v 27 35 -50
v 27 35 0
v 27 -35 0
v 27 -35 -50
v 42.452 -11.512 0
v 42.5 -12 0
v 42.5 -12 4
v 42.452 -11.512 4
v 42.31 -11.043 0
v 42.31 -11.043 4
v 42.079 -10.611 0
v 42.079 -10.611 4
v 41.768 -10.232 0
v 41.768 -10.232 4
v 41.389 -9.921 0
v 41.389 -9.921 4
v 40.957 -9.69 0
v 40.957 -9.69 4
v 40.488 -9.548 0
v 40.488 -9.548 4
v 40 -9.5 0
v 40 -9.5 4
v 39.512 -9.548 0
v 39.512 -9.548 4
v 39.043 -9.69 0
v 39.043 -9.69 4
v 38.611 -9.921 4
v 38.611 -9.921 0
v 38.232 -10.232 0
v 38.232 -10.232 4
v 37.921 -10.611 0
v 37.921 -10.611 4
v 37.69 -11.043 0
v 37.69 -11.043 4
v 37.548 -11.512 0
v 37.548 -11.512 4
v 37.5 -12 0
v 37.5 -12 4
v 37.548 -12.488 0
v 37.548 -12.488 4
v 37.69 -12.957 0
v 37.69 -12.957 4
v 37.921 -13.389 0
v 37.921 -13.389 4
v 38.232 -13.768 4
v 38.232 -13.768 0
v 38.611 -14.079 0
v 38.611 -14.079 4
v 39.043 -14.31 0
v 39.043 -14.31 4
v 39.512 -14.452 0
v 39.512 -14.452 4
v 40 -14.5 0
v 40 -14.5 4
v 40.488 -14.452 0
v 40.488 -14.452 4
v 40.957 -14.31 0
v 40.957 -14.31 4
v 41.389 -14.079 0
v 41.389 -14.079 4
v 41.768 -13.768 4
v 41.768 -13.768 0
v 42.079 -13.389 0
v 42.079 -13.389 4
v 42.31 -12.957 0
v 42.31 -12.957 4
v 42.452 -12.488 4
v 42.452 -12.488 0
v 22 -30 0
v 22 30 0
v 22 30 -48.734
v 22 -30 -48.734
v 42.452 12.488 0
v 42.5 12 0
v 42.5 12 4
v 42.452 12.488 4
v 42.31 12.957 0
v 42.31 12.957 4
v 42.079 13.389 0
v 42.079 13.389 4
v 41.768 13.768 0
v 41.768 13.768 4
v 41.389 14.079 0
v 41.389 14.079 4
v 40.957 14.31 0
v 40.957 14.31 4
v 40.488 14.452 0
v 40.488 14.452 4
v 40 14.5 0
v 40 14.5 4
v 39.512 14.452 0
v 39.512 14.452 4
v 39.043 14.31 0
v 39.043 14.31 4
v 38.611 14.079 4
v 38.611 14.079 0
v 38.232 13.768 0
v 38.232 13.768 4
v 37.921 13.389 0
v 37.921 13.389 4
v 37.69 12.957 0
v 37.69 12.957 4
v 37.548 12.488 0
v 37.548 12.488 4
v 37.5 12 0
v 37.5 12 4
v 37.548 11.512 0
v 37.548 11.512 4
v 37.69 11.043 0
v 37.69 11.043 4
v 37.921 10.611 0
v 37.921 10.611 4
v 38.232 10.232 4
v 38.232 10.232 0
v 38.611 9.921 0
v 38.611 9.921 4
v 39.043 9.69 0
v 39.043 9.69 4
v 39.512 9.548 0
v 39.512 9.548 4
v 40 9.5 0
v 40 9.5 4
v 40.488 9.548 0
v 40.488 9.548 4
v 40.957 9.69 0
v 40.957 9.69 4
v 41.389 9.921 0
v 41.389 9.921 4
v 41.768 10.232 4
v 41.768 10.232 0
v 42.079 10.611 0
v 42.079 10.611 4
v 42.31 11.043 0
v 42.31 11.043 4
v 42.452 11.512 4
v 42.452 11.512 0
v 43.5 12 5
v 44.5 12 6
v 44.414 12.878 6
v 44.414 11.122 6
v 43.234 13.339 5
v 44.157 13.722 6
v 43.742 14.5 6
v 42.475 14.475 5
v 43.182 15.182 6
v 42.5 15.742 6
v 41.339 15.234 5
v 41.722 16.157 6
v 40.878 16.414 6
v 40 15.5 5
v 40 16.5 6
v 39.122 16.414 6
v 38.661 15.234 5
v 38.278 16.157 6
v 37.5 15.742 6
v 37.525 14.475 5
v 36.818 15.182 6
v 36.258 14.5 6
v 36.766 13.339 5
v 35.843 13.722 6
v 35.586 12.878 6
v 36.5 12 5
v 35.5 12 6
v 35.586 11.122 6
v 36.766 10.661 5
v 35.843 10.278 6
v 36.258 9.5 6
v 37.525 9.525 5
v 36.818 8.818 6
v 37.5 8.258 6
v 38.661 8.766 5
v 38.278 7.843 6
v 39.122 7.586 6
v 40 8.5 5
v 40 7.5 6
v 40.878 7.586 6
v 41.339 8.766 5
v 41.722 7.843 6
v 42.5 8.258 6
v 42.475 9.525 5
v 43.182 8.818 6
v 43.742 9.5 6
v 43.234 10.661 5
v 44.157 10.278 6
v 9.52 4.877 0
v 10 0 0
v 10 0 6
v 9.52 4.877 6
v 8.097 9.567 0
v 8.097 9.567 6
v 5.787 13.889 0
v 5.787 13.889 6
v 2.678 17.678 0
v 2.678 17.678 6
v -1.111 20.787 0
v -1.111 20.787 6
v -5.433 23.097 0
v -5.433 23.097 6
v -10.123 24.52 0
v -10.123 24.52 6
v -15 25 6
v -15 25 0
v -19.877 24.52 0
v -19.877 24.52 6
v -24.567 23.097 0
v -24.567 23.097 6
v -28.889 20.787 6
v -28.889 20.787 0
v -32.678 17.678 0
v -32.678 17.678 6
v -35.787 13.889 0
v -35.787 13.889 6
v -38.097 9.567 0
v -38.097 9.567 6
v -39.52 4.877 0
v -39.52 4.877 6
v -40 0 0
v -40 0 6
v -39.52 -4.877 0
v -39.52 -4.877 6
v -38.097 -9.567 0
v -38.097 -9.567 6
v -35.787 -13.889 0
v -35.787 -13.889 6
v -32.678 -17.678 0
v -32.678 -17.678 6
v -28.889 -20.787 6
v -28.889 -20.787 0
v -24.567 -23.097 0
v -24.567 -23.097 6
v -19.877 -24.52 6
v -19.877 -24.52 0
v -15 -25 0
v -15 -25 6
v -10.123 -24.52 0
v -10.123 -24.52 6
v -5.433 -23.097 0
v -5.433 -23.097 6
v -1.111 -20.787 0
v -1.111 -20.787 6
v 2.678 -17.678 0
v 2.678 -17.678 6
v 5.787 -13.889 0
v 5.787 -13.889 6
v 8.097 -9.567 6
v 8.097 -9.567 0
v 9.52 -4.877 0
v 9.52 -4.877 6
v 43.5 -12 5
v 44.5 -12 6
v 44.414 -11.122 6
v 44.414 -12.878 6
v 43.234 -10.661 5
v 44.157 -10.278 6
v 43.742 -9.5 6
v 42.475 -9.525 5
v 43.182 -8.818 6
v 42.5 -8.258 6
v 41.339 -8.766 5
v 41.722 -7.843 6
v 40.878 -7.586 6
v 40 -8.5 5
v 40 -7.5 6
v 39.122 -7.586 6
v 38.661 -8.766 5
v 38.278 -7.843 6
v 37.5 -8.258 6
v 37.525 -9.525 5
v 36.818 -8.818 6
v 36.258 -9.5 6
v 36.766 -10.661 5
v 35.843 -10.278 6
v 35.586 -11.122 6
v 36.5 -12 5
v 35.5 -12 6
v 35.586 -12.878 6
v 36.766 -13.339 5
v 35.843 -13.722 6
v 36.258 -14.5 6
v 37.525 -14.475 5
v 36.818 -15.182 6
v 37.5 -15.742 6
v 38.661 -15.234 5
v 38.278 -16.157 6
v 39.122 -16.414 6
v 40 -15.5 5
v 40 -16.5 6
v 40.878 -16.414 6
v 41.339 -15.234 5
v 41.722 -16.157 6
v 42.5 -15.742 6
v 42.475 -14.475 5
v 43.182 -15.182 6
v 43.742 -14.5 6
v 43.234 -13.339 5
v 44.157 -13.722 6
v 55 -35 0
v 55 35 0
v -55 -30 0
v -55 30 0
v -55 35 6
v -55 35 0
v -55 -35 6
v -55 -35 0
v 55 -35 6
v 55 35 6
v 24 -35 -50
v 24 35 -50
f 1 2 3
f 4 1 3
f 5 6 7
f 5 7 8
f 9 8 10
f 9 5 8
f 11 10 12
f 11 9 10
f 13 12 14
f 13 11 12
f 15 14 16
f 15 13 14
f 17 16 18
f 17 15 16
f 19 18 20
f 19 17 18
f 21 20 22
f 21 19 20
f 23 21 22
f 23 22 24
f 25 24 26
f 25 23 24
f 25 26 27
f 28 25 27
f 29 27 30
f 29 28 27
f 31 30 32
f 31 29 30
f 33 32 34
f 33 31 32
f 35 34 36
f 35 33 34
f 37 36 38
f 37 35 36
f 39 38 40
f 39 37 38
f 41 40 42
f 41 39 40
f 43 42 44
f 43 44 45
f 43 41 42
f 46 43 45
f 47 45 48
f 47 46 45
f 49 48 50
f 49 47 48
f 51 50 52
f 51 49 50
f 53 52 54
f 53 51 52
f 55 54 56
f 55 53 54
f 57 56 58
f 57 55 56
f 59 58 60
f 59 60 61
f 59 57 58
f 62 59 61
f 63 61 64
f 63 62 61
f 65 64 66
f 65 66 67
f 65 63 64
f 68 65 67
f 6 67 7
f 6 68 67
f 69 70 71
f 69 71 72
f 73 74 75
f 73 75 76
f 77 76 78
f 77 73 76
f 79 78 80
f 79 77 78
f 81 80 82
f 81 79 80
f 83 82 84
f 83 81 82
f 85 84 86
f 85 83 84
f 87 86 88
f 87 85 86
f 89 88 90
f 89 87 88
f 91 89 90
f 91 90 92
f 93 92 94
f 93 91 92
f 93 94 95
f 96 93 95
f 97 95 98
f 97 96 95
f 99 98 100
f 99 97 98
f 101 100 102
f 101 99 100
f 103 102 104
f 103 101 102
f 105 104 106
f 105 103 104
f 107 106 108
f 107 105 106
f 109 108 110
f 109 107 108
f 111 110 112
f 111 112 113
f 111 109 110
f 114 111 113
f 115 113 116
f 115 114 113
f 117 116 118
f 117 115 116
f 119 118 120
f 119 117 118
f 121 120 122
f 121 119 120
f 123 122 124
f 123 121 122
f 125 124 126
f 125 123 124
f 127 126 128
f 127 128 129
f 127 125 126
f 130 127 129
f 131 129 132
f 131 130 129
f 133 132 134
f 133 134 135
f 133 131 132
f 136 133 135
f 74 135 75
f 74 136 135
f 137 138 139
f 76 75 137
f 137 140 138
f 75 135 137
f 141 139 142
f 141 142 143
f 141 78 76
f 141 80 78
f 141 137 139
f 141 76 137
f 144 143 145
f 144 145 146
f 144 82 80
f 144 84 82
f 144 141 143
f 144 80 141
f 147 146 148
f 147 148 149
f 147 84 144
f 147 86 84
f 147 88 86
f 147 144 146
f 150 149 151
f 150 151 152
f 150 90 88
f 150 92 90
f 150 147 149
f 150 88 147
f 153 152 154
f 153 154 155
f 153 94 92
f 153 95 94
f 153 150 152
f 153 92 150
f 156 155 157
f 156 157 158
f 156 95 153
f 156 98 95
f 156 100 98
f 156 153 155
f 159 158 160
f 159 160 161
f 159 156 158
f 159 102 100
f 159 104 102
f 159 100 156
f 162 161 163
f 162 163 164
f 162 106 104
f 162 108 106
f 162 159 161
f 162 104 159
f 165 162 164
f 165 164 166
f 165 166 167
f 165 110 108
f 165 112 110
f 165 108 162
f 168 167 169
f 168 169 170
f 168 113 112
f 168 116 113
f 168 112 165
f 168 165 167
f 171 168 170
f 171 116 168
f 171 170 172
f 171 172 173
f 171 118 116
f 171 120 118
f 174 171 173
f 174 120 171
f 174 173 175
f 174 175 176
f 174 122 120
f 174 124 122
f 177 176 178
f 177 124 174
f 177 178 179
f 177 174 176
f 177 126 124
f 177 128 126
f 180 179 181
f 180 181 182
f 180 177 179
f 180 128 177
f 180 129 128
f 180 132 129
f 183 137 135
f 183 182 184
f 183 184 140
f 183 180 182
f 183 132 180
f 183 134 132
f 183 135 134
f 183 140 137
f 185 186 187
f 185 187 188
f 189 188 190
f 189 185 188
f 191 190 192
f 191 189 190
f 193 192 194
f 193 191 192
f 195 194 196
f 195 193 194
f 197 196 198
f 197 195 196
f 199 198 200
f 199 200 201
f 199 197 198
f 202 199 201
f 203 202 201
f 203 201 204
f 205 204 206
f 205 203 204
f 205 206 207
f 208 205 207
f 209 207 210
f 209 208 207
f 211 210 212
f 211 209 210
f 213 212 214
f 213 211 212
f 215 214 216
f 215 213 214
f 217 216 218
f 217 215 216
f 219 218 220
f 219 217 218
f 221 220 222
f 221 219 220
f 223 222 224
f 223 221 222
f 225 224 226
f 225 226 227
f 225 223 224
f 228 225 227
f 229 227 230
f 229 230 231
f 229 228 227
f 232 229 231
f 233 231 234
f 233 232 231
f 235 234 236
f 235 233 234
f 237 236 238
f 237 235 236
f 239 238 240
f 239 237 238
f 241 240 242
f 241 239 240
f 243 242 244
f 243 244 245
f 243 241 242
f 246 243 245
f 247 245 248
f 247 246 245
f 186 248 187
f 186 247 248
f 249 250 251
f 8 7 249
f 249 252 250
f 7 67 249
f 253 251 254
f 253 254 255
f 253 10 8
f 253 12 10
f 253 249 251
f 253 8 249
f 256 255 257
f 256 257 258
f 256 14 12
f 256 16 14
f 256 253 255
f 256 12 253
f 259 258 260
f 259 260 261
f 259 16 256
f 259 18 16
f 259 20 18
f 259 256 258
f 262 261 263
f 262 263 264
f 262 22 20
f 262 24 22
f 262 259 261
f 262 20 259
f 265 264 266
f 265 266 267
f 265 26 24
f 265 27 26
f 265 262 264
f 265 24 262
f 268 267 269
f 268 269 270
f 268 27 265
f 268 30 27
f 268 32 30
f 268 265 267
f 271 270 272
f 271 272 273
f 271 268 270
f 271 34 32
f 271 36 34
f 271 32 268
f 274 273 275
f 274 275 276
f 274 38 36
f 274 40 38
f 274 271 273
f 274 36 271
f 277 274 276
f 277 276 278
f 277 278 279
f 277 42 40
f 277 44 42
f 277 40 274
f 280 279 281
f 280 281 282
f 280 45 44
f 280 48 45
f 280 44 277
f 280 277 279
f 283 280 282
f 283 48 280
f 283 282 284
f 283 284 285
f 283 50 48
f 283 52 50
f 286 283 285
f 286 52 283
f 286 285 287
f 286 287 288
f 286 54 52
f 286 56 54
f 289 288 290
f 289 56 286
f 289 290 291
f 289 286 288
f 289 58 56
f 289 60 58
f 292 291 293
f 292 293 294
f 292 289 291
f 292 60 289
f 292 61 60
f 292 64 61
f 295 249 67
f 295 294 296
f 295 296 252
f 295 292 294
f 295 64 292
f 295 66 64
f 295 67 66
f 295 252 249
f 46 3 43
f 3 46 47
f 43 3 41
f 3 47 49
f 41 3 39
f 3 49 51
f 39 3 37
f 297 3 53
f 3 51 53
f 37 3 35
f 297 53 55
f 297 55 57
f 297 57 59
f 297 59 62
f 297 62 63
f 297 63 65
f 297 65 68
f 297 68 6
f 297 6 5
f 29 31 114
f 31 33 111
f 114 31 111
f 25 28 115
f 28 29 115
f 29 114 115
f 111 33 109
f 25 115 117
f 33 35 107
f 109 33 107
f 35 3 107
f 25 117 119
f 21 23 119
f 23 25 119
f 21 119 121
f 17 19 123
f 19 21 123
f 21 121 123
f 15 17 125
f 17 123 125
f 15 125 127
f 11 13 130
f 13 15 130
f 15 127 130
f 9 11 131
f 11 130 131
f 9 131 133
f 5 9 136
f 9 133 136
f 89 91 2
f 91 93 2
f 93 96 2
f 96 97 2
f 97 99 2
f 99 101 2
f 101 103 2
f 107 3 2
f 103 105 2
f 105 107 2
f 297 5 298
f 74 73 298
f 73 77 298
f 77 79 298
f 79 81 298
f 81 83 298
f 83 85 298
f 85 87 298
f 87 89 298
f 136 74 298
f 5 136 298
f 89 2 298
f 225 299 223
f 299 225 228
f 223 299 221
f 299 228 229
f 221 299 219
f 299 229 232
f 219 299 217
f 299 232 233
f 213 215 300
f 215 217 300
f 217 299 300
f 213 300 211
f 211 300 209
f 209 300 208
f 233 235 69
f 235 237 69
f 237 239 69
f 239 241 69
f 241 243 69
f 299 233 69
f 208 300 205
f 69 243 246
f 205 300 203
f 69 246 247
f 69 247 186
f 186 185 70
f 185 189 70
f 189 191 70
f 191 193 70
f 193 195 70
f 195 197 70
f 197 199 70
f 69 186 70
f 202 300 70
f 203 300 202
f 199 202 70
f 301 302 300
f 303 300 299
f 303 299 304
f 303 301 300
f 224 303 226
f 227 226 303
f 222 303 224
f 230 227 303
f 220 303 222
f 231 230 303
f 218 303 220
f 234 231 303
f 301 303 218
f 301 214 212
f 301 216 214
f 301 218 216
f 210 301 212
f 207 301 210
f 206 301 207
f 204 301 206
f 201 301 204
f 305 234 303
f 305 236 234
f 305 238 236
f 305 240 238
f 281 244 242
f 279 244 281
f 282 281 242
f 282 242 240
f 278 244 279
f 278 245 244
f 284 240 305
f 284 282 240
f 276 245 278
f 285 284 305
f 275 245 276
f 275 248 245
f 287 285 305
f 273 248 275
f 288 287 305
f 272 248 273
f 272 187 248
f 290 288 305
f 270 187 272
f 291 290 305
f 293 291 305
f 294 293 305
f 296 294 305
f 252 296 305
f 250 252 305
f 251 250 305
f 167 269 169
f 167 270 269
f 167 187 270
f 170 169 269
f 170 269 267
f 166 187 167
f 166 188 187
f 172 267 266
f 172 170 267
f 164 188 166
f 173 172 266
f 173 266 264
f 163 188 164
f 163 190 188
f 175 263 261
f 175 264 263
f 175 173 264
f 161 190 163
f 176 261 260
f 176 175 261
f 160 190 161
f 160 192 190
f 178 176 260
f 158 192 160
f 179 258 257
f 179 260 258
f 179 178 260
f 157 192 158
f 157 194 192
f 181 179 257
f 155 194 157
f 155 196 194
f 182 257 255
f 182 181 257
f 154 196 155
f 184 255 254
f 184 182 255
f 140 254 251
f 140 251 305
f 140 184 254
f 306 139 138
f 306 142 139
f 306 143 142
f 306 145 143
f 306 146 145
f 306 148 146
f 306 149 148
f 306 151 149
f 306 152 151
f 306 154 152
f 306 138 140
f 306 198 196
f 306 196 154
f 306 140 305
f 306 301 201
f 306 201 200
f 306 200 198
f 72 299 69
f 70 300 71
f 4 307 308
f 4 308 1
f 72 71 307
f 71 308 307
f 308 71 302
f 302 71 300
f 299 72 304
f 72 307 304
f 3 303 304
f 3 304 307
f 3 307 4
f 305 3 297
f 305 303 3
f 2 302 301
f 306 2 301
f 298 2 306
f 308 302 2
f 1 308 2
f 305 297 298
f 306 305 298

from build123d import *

# Parameters (mm, degrees)
F0_W     = 110
F0_H     = 70
F0_R     = 2.5
F0_R_2   = 25
F1_DEPTH = 6
F2_W     = 5
F2_H     = 70
F3_DEPTH = 50
F4_W     = 77
F4_H     = 5
F5_DEPTH = 50
F7_DEPTH = 84.5
F8_SIZE  = 2
F9_SIZE  = 2


with BuildPart() as f1:
    # F0 (on Top) → F1 (new body)
    with BuildSketch(Plane.XY):
        Rectangle(F0_W, F0_H)
        with Locations((40, -12)):
            Circle(F0_R, mode=Mode.SUBTRACT)
        with Locations((-15, 0)):
            Circle(F0_R_2, mode=Mode.SUBTRACT)
        with Locations((40, 12)):
            Circle(F0_R, mode=Mode.SUBTRACT)
    extrude(amount=F1_DEPTH)

    # F2 (on face) → F3 (join)
    with BuildSketch(Plane(origin=(0, 0, 0), x_dir=(1, 0, 0), z_dir=(0, 0, -1))):
        with Locations((24.5, 0)):
            Rectangle(F2_W, F2_H)
    extrude(amount=F3_DEPTH)

    # F4 (on face) → F5 (join)
    with BuildSketch(Plane(origin=(0, 0, 0), x_dir=(1, 0, 0), z_dir=(0, 0, -1))):
        with Locations((-16.5, 32.5)):
            Rectangle(F4_W, F4_H)
        with Locations((-16.5, -32.5)):
            Rectangle(F4_W, F4_H)
    extrude(amount=F5_DEPTH)

    # F6 (on face) → F7 (cut)
    with BuildSketch(Plane.XZ.offset(35)):
        Polygon((24, -50), (-55, 0), (-55, -50), align=None)
    extrude(amount=-F7_DEPTH, mode=Mode.SUBTRACT)

    # F8
    f8_edges = [f1.edges().sort_by_distance(p)[0] for p in [
        (37.5, 12, 6),
    ]]
    chamfer(f8_edges, length=F8_SIZE)

    # F9
    f9_edges = [f1.edges().sort_by_distance(p)[0] for p in [
        (37.5, -12, 6),
    ]]
    chamfer(f9_edges, length=F9_SIZE)


solid = f1.part
